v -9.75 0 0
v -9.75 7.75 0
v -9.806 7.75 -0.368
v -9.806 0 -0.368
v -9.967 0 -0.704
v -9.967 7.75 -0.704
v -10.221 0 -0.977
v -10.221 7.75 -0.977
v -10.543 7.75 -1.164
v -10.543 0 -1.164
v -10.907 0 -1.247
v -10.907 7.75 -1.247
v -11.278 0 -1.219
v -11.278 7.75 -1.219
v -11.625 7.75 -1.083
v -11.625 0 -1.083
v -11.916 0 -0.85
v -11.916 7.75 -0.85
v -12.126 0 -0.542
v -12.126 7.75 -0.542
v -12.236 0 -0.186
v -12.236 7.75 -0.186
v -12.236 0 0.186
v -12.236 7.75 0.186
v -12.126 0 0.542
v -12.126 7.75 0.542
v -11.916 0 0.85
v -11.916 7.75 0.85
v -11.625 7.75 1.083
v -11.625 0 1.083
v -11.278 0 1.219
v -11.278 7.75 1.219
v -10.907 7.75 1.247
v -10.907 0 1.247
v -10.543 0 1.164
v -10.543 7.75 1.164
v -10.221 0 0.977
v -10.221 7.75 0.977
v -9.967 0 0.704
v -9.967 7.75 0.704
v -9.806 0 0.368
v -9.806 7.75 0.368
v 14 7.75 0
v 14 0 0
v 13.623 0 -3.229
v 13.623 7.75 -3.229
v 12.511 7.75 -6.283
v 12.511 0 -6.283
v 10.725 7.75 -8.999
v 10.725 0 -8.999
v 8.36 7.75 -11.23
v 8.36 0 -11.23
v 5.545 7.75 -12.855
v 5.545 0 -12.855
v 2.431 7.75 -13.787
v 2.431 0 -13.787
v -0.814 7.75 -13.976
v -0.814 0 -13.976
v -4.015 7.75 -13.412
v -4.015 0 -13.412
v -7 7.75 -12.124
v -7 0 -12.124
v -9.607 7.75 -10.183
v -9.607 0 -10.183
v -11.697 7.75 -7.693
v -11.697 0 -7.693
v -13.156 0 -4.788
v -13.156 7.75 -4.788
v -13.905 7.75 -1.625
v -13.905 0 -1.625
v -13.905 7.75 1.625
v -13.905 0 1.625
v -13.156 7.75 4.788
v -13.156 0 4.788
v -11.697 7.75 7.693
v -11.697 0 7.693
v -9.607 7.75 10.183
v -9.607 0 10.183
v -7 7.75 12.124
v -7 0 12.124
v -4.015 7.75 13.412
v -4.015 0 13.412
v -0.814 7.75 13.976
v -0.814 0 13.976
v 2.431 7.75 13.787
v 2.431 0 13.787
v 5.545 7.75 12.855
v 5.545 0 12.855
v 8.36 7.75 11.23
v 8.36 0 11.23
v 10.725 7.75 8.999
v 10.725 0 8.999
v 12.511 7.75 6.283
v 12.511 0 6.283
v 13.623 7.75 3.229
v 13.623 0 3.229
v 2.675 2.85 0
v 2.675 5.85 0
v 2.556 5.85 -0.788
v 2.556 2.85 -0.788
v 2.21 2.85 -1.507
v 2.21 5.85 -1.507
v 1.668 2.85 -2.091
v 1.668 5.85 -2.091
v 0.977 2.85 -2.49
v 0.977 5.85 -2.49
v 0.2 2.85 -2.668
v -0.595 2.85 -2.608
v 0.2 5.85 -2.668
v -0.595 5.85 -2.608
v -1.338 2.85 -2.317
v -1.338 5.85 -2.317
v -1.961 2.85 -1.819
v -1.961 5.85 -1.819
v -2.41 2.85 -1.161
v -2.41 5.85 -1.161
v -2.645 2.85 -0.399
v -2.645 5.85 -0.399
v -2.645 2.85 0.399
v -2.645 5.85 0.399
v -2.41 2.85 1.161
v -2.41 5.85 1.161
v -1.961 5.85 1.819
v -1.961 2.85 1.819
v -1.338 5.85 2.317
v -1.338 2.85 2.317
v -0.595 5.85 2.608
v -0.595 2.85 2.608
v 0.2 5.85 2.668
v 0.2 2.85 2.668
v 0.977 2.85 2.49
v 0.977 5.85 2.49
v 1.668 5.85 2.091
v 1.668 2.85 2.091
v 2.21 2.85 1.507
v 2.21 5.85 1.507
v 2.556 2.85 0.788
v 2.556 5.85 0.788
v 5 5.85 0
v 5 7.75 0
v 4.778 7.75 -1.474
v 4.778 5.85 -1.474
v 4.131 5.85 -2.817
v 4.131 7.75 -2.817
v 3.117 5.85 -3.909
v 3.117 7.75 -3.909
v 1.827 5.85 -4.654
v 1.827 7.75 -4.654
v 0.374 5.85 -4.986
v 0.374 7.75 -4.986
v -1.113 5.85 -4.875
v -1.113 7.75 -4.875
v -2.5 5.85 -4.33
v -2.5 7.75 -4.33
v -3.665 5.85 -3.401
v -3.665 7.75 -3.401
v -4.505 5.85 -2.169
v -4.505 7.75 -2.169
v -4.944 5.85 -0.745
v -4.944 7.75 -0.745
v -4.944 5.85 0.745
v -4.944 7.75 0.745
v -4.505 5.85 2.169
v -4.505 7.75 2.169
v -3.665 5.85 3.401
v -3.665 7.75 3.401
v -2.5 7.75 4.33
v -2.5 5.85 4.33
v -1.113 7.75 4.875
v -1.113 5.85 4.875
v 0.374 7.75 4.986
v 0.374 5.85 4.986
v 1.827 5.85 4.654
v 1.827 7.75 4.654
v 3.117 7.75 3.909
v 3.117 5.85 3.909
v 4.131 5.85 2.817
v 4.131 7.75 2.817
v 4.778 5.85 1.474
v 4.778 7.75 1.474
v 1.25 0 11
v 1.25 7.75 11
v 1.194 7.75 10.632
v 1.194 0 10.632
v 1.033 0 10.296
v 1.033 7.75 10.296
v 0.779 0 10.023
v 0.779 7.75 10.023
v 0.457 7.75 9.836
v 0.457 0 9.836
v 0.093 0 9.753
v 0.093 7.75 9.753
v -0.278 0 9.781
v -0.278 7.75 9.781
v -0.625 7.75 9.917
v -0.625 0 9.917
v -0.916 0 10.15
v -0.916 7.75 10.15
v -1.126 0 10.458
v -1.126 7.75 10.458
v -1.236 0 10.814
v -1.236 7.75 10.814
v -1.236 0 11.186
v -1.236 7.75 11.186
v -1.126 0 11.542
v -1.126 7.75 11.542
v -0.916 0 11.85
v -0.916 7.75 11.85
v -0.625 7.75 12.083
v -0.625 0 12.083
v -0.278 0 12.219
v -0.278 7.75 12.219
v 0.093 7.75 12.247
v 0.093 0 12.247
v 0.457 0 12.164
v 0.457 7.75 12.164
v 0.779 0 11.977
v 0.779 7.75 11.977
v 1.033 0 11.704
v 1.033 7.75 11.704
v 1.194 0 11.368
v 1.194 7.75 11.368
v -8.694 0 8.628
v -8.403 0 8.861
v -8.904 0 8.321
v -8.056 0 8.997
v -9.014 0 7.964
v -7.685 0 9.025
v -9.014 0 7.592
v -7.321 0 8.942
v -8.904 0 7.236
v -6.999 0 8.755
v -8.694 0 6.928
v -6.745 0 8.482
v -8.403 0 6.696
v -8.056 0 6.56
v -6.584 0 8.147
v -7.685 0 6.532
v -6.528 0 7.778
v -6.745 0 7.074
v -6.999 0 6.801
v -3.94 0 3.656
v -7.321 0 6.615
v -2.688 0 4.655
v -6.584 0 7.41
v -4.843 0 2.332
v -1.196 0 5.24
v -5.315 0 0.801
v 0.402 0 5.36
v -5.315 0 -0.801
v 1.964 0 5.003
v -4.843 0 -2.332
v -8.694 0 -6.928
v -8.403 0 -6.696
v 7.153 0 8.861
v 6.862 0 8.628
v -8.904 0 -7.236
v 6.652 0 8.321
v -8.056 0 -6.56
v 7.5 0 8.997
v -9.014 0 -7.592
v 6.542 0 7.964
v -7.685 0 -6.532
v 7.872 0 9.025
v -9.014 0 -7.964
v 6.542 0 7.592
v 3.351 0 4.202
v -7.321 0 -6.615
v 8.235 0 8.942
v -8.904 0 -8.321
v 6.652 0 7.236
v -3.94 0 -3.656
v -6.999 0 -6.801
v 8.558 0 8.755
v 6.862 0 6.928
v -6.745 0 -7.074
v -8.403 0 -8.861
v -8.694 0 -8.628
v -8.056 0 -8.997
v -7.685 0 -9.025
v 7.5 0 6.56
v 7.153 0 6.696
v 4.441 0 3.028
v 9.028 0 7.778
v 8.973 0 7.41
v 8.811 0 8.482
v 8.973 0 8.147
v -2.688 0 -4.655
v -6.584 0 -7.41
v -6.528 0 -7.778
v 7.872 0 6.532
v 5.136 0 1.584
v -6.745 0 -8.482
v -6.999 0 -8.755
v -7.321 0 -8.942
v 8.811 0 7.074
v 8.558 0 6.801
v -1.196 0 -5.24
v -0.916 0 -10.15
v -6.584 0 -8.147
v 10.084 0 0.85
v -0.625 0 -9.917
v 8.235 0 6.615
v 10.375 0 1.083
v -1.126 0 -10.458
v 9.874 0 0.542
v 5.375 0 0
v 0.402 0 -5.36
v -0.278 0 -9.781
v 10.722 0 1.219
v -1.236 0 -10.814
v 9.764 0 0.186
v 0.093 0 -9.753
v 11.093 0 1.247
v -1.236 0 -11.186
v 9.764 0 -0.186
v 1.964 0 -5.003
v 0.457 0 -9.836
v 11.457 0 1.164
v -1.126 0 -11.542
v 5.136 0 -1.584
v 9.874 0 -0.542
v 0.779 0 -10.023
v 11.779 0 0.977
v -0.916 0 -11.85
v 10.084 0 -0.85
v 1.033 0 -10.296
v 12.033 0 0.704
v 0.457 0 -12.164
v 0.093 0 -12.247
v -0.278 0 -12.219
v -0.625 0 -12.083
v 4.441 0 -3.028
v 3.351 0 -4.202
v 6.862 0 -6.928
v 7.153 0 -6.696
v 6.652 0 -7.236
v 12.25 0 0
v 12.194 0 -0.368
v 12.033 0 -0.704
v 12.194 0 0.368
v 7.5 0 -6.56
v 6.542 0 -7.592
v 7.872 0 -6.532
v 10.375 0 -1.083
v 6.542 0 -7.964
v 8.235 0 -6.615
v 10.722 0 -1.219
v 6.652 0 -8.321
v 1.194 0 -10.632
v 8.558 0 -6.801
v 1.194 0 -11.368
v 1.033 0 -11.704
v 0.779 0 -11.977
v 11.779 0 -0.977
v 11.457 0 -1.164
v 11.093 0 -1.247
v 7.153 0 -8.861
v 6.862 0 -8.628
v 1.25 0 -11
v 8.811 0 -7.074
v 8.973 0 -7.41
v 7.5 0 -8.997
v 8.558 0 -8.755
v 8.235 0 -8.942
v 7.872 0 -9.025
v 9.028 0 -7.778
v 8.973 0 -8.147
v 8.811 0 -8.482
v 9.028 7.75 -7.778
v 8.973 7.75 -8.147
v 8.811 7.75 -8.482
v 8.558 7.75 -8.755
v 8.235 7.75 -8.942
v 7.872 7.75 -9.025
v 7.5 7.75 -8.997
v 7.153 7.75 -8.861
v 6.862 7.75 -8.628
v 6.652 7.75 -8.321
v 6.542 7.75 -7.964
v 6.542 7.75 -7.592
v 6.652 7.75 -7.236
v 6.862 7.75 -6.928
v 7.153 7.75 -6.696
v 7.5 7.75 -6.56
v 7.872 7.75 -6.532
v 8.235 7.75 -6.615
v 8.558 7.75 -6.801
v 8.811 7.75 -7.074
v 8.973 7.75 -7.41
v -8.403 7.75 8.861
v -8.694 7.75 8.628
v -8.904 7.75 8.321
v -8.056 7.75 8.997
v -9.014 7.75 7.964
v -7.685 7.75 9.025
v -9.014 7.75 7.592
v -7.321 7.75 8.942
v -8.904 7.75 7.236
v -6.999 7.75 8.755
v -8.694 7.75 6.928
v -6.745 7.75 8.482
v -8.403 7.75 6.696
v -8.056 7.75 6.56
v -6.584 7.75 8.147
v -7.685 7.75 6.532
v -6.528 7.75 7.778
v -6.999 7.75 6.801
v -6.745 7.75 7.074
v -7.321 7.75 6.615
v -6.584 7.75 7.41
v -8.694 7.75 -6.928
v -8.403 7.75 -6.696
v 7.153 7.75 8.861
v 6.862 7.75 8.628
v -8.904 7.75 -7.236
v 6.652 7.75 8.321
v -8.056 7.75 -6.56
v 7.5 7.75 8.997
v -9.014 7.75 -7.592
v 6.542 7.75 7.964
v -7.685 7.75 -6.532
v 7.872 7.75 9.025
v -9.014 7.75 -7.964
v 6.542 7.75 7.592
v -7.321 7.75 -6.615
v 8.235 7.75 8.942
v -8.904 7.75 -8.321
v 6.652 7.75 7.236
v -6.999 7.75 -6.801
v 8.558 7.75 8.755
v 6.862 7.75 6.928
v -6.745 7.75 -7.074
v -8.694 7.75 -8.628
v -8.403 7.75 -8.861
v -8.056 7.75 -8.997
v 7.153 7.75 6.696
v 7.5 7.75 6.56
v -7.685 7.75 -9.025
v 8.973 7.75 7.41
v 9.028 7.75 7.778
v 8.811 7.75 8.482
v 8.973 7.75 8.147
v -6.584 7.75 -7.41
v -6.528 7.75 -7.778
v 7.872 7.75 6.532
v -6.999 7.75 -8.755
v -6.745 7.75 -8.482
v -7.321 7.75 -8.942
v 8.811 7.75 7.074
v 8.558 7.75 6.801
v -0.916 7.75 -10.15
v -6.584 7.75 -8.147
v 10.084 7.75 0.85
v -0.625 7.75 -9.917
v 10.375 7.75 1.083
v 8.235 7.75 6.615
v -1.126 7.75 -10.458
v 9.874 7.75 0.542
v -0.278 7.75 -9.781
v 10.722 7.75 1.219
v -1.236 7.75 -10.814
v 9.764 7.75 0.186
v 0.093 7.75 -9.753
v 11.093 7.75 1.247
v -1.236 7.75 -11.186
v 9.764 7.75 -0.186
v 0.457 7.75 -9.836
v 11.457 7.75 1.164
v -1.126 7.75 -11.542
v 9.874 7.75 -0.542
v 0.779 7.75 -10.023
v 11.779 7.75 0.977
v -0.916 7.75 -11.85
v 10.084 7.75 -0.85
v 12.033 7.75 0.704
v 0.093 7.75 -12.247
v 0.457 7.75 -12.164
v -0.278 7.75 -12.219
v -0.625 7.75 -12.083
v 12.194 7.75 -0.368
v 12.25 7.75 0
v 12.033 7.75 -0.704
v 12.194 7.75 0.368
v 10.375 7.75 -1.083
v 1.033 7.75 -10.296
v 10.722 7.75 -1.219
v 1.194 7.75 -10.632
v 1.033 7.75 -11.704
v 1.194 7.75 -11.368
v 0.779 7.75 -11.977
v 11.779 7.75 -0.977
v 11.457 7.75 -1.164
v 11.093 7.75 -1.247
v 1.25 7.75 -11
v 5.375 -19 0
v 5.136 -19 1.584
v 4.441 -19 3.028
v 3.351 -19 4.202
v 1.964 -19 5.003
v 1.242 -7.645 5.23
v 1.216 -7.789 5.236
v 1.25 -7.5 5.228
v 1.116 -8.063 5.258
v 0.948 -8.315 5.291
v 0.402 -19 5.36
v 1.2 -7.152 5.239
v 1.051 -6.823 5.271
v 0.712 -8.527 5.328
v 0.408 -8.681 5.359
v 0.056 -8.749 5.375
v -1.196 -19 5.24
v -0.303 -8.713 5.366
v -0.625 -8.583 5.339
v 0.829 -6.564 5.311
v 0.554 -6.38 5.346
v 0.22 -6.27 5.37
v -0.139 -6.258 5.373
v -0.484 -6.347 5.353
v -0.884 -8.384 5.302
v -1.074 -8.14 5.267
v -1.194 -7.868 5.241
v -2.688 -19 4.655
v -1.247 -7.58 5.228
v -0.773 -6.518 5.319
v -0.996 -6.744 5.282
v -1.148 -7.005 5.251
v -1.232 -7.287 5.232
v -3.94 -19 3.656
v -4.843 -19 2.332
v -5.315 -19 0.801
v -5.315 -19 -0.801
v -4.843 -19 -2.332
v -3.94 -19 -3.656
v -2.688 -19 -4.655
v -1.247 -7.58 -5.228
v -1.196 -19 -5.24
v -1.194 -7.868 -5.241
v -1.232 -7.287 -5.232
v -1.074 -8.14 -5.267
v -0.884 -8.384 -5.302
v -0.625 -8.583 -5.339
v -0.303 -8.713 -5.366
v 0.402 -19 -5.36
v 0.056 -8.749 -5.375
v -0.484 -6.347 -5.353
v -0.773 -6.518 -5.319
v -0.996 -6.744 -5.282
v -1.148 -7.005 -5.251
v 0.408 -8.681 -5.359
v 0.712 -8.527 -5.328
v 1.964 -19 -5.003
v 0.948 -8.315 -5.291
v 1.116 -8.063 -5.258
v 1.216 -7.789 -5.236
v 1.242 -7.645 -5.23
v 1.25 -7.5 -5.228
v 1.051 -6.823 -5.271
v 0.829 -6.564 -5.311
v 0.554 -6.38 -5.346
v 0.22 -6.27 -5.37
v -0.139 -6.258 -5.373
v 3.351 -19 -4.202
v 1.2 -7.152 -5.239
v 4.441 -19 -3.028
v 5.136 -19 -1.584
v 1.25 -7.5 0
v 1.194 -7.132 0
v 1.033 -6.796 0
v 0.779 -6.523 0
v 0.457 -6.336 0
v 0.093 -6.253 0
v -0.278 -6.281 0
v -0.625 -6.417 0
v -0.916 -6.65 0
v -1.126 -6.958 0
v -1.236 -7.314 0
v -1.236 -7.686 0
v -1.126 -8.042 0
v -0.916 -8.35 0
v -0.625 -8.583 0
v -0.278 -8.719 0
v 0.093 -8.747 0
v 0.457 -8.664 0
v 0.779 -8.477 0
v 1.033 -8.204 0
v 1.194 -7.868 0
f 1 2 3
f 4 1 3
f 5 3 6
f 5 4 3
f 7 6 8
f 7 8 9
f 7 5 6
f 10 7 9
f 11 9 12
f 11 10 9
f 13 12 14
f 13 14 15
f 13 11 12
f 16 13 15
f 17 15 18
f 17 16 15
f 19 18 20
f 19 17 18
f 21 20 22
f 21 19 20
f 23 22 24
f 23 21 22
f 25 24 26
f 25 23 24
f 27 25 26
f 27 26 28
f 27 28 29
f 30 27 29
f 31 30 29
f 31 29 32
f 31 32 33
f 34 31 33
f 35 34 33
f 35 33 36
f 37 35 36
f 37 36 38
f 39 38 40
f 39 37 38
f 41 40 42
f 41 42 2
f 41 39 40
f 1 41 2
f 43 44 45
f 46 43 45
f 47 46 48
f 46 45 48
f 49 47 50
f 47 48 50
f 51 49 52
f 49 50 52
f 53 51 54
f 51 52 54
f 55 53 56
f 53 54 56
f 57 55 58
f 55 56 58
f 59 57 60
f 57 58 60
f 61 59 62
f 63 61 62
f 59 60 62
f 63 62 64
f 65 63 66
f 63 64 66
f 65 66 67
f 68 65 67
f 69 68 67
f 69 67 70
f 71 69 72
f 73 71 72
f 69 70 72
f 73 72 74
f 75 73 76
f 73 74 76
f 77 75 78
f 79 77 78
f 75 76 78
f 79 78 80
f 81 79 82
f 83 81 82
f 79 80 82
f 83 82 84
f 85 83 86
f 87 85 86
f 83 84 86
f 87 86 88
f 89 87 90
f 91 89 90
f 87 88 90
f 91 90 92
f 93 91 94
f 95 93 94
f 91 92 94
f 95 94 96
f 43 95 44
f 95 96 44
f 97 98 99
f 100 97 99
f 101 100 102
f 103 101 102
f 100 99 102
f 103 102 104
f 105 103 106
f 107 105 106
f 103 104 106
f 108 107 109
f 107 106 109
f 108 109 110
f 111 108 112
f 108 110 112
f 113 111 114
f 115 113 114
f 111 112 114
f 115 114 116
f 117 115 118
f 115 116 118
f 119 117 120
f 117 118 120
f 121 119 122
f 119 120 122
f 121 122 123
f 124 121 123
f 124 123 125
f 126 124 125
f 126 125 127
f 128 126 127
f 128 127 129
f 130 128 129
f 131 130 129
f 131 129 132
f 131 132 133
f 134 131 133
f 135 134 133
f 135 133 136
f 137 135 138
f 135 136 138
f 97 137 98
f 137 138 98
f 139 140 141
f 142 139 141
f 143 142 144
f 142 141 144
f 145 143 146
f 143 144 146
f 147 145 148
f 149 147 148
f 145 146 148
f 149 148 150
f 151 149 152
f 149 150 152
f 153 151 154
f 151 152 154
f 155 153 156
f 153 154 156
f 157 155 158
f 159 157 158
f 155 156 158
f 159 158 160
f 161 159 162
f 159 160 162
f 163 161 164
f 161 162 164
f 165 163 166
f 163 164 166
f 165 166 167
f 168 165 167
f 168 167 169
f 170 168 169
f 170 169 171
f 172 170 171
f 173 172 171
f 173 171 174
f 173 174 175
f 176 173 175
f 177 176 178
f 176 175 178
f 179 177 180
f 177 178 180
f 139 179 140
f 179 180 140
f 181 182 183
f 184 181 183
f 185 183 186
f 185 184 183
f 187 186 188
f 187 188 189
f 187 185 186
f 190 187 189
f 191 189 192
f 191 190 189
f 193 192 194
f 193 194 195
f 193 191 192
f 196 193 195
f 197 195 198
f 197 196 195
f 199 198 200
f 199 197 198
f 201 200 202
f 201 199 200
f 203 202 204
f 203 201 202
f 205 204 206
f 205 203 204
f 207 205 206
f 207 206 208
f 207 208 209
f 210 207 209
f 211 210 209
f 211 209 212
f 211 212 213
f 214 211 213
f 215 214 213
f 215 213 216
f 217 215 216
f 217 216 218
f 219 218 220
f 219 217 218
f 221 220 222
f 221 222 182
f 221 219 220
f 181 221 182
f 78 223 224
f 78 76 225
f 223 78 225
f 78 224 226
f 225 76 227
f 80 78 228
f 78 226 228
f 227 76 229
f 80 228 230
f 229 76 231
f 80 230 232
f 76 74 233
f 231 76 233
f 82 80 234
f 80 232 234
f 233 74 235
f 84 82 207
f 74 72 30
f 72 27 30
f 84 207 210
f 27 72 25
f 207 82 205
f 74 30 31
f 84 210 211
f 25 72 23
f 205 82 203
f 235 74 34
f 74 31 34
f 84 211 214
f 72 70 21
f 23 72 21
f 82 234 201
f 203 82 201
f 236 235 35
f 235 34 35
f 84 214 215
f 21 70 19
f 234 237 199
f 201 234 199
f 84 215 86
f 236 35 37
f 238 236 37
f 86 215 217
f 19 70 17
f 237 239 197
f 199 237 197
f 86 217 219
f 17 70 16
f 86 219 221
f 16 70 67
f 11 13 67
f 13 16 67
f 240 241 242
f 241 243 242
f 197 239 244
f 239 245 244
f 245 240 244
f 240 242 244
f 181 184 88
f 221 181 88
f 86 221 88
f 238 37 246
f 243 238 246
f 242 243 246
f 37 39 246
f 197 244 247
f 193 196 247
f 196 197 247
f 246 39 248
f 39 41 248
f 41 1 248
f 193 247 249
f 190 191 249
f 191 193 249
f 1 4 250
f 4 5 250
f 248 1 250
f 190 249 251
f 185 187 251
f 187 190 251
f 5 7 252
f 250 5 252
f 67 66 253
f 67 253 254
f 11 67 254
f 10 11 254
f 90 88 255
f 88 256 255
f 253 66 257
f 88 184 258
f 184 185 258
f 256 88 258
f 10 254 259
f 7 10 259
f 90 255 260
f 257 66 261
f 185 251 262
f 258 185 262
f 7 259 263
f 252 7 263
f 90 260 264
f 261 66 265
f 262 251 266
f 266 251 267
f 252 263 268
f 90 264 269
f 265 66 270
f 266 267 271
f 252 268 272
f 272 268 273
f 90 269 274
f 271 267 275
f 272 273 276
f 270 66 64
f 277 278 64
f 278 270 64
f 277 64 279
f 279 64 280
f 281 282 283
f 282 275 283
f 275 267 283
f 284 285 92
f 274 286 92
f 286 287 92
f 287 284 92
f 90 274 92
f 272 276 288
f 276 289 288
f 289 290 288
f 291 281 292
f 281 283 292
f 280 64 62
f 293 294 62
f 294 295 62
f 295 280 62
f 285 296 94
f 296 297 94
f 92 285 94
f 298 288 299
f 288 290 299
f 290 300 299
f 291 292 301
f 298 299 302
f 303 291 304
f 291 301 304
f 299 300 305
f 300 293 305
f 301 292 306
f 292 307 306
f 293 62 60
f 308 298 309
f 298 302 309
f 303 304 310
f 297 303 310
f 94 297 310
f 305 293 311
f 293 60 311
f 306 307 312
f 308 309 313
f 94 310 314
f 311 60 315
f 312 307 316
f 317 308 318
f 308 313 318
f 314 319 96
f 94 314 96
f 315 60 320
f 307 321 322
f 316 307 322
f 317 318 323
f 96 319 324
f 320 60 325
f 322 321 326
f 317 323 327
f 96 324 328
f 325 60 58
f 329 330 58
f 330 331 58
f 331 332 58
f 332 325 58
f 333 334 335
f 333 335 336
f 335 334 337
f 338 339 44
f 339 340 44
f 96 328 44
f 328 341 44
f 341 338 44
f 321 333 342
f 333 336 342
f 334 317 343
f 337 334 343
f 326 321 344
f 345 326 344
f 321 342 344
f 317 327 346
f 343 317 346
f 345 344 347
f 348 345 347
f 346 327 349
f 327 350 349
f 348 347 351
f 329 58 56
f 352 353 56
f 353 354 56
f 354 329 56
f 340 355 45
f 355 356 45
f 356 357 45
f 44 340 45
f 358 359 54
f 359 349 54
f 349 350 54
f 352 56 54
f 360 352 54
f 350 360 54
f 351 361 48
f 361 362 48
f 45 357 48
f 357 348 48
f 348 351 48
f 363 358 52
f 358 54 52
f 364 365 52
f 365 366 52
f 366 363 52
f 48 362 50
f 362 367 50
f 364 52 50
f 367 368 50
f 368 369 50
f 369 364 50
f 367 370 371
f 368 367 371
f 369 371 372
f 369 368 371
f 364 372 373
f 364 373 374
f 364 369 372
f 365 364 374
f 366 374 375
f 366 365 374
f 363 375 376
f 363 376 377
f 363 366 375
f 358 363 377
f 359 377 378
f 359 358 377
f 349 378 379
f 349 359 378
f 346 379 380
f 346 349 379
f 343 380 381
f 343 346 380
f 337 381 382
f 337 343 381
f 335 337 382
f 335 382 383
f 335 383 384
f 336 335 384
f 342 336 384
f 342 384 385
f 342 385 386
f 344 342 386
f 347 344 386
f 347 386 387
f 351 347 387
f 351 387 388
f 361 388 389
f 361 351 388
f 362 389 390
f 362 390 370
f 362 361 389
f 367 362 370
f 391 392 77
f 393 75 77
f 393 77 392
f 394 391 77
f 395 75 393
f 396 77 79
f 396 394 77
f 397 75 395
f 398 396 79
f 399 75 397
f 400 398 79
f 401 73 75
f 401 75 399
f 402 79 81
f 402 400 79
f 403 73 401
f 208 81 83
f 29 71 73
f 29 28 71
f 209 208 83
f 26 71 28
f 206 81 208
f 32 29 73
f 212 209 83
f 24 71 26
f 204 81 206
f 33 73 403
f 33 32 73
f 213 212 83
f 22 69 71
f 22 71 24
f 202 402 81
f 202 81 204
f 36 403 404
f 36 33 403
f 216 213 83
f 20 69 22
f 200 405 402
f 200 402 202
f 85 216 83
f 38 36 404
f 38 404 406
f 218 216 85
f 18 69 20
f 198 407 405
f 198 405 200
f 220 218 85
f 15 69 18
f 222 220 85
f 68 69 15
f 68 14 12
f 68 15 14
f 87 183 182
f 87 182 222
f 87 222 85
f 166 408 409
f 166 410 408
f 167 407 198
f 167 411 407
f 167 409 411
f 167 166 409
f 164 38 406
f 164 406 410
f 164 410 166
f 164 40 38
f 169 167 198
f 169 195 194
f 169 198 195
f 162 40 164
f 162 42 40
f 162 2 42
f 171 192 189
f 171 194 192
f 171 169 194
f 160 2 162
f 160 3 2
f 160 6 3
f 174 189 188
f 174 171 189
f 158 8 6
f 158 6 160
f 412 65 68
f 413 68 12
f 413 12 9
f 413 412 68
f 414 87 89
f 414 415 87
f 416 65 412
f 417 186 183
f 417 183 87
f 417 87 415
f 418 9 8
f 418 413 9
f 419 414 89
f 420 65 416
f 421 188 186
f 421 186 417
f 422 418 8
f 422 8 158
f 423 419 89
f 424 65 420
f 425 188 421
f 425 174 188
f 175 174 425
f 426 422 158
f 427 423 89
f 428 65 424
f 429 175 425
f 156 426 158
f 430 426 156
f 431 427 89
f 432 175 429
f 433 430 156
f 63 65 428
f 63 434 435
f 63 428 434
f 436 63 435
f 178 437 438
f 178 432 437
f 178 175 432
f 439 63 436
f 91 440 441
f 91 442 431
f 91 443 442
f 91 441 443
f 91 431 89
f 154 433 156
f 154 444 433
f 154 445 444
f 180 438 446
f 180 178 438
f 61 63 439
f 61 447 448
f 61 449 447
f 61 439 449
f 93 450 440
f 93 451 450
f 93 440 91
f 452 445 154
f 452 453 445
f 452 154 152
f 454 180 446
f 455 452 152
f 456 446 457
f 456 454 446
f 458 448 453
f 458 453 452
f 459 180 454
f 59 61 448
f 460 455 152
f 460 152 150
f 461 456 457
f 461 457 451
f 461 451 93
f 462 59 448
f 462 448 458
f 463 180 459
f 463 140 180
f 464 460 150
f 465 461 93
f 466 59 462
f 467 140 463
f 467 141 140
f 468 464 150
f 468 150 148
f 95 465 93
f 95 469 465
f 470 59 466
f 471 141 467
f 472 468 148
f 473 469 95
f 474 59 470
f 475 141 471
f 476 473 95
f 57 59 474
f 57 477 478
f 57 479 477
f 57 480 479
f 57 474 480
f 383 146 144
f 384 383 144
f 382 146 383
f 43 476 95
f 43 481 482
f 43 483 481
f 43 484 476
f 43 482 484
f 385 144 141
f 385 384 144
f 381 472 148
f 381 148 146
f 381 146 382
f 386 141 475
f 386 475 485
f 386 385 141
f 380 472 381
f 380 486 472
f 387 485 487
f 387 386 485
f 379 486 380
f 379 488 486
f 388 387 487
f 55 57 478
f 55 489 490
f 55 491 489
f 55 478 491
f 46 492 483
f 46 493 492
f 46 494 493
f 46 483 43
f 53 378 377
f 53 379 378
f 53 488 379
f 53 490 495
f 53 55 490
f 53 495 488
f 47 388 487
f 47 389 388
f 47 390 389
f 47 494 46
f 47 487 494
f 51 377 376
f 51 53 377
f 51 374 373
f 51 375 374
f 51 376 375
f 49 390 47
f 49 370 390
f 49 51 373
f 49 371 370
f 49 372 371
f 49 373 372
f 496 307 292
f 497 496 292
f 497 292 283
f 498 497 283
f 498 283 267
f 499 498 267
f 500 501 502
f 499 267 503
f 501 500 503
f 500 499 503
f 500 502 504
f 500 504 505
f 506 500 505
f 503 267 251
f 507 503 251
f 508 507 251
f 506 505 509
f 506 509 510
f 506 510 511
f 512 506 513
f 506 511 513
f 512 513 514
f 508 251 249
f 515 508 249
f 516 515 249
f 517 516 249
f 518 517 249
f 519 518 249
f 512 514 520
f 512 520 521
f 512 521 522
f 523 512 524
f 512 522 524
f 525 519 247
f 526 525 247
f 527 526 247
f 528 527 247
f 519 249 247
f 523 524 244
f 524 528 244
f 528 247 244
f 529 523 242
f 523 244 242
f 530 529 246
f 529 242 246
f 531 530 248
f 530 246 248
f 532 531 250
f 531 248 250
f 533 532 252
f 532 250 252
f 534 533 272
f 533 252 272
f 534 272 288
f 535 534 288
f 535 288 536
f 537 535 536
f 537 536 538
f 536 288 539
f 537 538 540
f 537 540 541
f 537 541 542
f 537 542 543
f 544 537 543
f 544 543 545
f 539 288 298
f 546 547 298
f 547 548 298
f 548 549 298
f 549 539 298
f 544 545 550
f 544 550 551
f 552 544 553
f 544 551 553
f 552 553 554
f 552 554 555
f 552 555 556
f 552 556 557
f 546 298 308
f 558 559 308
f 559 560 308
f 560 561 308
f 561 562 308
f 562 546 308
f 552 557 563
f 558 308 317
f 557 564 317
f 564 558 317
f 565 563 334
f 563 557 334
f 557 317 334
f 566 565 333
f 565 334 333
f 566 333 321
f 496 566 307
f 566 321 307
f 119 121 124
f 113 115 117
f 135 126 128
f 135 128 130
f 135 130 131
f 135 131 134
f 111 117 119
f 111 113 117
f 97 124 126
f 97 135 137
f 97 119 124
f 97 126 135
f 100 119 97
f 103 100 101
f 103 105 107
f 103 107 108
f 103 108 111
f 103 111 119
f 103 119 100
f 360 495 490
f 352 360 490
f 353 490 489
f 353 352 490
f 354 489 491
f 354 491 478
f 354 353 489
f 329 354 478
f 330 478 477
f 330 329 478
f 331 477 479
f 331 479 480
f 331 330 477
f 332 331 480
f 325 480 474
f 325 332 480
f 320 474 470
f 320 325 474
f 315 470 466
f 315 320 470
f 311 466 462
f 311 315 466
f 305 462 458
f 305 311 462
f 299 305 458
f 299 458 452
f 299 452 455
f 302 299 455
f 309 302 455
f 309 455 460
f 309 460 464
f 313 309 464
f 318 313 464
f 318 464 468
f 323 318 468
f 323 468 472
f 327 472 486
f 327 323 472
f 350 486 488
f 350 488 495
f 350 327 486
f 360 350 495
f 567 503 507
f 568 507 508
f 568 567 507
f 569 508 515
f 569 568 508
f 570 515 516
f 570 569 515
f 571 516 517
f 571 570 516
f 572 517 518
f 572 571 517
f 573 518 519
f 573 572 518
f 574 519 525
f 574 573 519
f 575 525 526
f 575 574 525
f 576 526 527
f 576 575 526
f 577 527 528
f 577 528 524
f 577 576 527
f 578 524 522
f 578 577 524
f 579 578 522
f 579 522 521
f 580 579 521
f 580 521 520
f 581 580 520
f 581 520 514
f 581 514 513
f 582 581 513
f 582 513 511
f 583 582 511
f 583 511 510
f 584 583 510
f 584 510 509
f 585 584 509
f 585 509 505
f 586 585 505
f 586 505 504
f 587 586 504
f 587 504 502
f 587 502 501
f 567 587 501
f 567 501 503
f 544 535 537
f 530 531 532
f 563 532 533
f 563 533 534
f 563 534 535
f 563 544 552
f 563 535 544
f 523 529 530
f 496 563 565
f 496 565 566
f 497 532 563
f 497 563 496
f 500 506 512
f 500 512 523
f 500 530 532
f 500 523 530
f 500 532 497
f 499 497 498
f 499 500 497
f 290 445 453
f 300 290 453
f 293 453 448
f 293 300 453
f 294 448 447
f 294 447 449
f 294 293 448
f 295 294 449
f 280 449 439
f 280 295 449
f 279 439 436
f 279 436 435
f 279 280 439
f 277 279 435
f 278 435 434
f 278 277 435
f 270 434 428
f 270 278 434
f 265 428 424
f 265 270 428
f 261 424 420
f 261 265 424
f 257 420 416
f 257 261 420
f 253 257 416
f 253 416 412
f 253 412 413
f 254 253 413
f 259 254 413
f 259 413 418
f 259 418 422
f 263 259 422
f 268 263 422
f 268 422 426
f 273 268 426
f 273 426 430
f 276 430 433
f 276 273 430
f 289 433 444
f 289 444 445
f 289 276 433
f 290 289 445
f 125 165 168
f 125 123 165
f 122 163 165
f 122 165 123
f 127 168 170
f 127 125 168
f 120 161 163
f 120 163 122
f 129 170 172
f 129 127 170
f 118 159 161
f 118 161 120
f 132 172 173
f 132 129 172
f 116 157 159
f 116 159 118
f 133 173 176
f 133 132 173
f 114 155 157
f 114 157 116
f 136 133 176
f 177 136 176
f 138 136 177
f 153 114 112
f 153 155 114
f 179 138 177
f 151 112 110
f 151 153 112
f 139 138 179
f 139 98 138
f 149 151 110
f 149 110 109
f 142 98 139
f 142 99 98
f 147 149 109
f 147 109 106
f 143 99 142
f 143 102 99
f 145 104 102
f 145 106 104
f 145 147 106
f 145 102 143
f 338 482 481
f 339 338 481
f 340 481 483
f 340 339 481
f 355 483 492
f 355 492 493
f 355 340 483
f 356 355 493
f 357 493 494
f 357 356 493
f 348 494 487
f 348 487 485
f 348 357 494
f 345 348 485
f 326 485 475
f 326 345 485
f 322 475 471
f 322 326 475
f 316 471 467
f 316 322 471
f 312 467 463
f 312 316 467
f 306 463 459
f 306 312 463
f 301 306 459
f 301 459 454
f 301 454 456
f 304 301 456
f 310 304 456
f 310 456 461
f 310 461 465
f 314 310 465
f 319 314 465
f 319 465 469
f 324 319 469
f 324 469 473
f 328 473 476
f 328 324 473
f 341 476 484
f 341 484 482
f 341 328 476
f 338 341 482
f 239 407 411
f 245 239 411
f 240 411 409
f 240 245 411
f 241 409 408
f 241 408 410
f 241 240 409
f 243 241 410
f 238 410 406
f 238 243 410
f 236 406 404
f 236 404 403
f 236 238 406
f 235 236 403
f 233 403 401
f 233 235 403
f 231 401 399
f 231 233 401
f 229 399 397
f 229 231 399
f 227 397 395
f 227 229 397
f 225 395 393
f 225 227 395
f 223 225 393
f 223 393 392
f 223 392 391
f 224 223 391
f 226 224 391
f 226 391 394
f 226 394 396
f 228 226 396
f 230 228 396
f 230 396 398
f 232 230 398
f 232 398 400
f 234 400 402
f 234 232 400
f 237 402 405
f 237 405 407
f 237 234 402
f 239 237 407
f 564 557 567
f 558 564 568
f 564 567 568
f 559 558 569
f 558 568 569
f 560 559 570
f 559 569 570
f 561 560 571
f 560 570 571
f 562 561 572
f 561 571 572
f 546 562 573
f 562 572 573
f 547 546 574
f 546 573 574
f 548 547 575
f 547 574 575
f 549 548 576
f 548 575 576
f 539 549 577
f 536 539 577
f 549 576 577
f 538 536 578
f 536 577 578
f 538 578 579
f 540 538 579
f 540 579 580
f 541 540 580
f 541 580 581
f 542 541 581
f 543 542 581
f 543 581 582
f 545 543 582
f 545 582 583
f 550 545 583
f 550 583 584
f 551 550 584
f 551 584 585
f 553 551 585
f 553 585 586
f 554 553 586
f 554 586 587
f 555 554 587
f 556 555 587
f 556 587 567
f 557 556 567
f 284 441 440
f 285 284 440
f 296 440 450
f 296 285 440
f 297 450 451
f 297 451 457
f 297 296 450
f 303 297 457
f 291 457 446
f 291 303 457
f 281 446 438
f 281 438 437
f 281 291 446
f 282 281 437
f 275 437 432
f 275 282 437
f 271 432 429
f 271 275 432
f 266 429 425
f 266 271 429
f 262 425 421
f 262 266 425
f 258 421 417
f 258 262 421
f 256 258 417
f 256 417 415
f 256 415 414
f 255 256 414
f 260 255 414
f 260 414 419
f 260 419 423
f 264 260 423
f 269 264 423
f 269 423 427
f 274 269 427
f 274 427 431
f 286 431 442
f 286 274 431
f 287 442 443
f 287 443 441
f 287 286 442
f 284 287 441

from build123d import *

# Parameters (mm, degrees)
SKETCH1_R               = 14
SKETCH1_R_2             = 1.25
BOSS_EXTRUDE1_DEPTH     = 7.75
SKETCH2_R               = 5
CUT_EXTRUDE1_DEPTH      = 1.9
SKETCH5_R               = 2.675
CUT_EXTRUDE3_DEPTH      = 3
SKETCH3_R               = 5.375
BOSS_EXTRUDE2_DEPTH     = 19
SKETCH4_R               = 1.25
CUT_EXTRUDE4_DEPTH      = 15
CUT_EXTRUDE4_DEPTH_BACK = 15


with BuildPart() as part:
    # Sketch1 → Boss-Extrude1 (new body)
    with BuildSketch(Plane(origin=(0, 0, 0), x_dir=(1, 0, 0), z_dir=(0, 1, 0))):
        Circle(SKETCH1_R)
        with Locations((-7.778174593, 7.778174593)):
            Circle(SKETCH1_R_2, mode=Mode.SUBTRACT)
        with Locations((0, 11)):
            Circle(SKETCH1_R_2, mode=Mode.SUBTRACT)
        with Locations((7.778174593, 7.778174593)):
            Circle(SKETCH1_R_2, mode=Mode.SUBTRACT)
        with Locations((11, 0)):
            Circle(SKETCH1_R_2, mode=Mode.SUBTRACT)
        with Locations((7.778174593, -7.778174593)):
            Circle(SKETCH1_R_2, mode=Mode.SUBTRACT)
        with Locations((0, -11)):
            Circle(SKETCH1_R_2, mode=Mode.SUBTRACT)
        with Locations((-11, 0)):
            Circle(SKETCH1_R_2, mode=Mode.SUBTRACT)
        with Locations((-7.778174593, -7.778174593)):
            Circle(SKETCH1_R_2, mode=Mode.SUBTRACT)
    extrude(amount=BOSS_EXTRUDE1_DEPTH)

    # Sketch2 → Cut-Extrude1 (cut)
    with BuildSketch(Plane(origin=(0, 7.75, 0), x_dir=(1, 0, 0), z_dir=(0, 1, 0))):
        Circle(SKETCH2_R)
    extrude(amount=-CUT_EXTRUDE1_DEPTH, mode=Mode.SUBTRACT)

    # Sketch5 → Cut-Extrude3 (cut)
    with BuildSketch(Plane(origin=(0, 5.85, 0), x_dir=(1, 0, 0), z_dir=(0, 1, 0))):
        Circle(SKETCH5_R)
    extrude(amount=-CUT_EXTRUDE3_DEPTH, mode=Mode.SUBTRACT)

    # Sketch3 → Boss-Extrude2 (add)
    with BuildSketch(Plane.XZ):
        Circle(SKETCH3_R)
    extrude(amount=BOSS_EXTRUDE2_DEPTH)

    # Sketch4 → Cut-Extrude4 (cut, two sides)
    with BuildSketch(Plane.XY) as cut_extrude4_sk:
        with Locations((0, -7.5)):
            Circle(SKETCH4_R)
    extrude(amount=CUT_EXTRUDE4_DEPTH, mode=Mode.SUBTRACT)
    extrude(cut_extrude4_sk.sketch, amount=-CUT_EXTRUDE4_DEPTH_BACK, mode=Mode.SUBTRACT)


solid = part.part
